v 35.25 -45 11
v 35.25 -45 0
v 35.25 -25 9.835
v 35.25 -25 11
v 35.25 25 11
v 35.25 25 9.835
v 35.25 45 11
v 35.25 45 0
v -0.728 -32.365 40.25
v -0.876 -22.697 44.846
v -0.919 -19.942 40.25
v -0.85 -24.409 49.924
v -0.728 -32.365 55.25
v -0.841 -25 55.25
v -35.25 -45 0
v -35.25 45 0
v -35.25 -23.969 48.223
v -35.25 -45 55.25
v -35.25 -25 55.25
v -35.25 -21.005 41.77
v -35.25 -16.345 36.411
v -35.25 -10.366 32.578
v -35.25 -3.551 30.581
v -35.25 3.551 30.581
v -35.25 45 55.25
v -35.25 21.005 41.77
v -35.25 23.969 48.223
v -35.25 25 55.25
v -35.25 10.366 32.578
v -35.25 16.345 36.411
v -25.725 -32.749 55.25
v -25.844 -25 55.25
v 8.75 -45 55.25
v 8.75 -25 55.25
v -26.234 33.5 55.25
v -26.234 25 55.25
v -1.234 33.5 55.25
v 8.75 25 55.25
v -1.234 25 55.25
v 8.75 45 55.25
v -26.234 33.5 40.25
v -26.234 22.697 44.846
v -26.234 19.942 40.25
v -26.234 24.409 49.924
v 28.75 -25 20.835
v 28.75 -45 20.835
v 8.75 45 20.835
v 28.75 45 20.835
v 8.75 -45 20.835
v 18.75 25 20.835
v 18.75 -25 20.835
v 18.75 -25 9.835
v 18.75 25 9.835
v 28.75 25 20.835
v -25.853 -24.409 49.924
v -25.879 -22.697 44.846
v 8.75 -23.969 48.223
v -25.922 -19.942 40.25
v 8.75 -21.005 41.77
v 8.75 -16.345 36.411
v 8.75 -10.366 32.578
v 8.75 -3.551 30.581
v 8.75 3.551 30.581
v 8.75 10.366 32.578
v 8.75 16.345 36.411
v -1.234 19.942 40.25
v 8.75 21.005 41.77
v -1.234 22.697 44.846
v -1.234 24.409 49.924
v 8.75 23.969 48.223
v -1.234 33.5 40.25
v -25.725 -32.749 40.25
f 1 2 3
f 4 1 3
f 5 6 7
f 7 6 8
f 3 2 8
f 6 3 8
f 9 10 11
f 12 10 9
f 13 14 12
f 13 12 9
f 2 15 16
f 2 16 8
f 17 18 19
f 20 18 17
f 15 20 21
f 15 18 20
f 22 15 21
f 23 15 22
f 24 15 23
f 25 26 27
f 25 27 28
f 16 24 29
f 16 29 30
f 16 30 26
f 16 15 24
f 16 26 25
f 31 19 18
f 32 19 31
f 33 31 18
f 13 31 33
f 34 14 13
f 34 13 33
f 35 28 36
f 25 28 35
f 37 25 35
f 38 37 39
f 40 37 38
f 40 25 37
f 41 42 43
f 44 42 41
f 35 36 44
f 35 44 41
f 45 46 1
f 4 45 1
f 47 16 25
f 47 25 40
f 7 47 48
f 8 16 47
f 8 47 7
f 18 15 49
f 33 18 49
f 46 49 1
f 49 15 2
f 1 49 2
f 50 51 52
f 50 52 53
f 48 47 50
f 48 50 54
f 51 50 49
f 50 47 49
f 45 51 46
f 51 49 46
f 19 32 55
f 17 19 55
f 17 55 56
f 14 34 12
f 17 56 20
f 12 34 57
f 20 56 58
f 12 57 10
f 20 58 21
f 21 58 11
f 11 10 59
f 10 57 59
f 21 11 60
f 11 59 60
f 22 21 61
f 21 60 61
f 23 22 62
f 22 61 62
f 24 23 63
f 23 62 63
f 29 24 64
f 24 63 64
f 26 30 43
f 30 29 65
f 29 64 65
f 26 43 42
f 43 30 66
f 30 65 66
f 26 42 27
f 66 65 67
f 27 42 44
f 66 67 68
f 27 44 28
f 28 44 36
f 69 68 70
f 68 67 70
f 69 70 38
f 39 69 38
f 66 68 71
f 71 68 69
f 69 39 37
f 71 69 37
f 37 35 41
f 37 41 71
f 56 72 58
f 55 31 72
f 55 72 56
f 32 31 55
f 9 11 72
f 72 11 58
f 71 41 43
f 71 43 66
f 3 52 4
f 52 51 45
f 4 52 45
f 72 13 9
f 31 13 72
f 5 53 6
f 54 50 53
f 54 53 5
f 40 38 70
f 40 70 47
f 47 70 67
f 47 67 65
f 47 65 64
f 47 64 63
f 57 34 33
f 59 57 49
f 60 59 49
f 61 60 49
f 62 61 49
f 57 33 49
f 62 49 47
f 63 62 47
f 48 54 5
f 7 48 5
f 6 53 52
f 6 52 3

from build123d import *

# Parameters (mm, degrees)
SKETCH2_W               = 70.5
SKETCH2_H               = 90
BOSS_EXTRUDE1_DEPTH     = 55.25
CUT_EXTRUDE1_DEPTH      = 91
SKETCH4_R               = 25
CUT_EXTRUDE2_DEPTH      = 45
SKETCH6_W               = 16.5
SKETCH6_H               = 50
CUT_EXTRUDE3_DEPTH      = 35.414718703
CUT_EXTRUDE3_DEPTH_BACK = 11
SKETCH7_W               = 25
SKETCH7_H               = 15
CUT_EXTRUDE4_DEPTH      = 15


with BuildPart() as part:
    # Sketch2 → Boss-Extrude1 (new body)
    with BuildSketch(Plane.XY):
        Rectangle(SKETCH2_W, SKETCH2_H)
    extrude(amount=BOSS_EXTRUDE1_DEPTH)

    # Sketch3 → Cut-Extrude1 (cut, through all)
    with BuildSketch(Plane.XZ.offset(45)):
        Polygon((28.75, 20.835281297), (35.25, 11), (35.25, 55.25), (8.75, 55.25), (8.75, 20.835281297), align=None)
    extrude(amount=-CUT_EXTRUDE1_DEPTH, mode=Mode.SUBTRACT)

    # Sketch4 → Cut-Extrude2 (cut, through all)
    with BuildSketch(Plane(origin=(8.75, 0, 0), x_dir=(0, 0, -1), z_dir=(1, 0, 0))):
        with Locations((-55.327535333, 0)):
            Circle(SKETCH4_R)
    extrude(amount=-CUT_EXTRUDE2_DEPTH, mode=Mode.SUBTRACT)

    # Sketch6 → Cut-Extrude3 (cut, two sides)
    with BuildSketch(Plane.XY.offset(20.835281297)) as cut_extrude3_sk:
        with Locations((27, 0)):
            Rectangle(SKETCH6_W, SKETCH6_H)
    extrude(amount=CUT_EXTRUDE3_DEPTH, mode=Mode.SUBTRACT)
    extrude(cut_extrude3_sk.sketch, amount=-CUT_EXTRUDE3_DEPTH_BACK, mode=Mode.SUBTRACT)

    # Sketch7 → Cut-Extrude4 (cut)
    with BuildSketch(Plane.XY.offset(55.25)):
        with Locations((-13.733691731, 26)):
            Rectangle(SKETCH7_W, SKETCH7_H)
        Polygon((-25.955312552, -17.750715844), (-0.958260941, -17.366774787), (-0.727896306, -32.365005754), (-25.724947918, -32.748946811), align=None)
    extrude(amount=-CUT_EXTRUDE4_DEPTH, mode=Mode.SUBTRACT)


solid = part.part
